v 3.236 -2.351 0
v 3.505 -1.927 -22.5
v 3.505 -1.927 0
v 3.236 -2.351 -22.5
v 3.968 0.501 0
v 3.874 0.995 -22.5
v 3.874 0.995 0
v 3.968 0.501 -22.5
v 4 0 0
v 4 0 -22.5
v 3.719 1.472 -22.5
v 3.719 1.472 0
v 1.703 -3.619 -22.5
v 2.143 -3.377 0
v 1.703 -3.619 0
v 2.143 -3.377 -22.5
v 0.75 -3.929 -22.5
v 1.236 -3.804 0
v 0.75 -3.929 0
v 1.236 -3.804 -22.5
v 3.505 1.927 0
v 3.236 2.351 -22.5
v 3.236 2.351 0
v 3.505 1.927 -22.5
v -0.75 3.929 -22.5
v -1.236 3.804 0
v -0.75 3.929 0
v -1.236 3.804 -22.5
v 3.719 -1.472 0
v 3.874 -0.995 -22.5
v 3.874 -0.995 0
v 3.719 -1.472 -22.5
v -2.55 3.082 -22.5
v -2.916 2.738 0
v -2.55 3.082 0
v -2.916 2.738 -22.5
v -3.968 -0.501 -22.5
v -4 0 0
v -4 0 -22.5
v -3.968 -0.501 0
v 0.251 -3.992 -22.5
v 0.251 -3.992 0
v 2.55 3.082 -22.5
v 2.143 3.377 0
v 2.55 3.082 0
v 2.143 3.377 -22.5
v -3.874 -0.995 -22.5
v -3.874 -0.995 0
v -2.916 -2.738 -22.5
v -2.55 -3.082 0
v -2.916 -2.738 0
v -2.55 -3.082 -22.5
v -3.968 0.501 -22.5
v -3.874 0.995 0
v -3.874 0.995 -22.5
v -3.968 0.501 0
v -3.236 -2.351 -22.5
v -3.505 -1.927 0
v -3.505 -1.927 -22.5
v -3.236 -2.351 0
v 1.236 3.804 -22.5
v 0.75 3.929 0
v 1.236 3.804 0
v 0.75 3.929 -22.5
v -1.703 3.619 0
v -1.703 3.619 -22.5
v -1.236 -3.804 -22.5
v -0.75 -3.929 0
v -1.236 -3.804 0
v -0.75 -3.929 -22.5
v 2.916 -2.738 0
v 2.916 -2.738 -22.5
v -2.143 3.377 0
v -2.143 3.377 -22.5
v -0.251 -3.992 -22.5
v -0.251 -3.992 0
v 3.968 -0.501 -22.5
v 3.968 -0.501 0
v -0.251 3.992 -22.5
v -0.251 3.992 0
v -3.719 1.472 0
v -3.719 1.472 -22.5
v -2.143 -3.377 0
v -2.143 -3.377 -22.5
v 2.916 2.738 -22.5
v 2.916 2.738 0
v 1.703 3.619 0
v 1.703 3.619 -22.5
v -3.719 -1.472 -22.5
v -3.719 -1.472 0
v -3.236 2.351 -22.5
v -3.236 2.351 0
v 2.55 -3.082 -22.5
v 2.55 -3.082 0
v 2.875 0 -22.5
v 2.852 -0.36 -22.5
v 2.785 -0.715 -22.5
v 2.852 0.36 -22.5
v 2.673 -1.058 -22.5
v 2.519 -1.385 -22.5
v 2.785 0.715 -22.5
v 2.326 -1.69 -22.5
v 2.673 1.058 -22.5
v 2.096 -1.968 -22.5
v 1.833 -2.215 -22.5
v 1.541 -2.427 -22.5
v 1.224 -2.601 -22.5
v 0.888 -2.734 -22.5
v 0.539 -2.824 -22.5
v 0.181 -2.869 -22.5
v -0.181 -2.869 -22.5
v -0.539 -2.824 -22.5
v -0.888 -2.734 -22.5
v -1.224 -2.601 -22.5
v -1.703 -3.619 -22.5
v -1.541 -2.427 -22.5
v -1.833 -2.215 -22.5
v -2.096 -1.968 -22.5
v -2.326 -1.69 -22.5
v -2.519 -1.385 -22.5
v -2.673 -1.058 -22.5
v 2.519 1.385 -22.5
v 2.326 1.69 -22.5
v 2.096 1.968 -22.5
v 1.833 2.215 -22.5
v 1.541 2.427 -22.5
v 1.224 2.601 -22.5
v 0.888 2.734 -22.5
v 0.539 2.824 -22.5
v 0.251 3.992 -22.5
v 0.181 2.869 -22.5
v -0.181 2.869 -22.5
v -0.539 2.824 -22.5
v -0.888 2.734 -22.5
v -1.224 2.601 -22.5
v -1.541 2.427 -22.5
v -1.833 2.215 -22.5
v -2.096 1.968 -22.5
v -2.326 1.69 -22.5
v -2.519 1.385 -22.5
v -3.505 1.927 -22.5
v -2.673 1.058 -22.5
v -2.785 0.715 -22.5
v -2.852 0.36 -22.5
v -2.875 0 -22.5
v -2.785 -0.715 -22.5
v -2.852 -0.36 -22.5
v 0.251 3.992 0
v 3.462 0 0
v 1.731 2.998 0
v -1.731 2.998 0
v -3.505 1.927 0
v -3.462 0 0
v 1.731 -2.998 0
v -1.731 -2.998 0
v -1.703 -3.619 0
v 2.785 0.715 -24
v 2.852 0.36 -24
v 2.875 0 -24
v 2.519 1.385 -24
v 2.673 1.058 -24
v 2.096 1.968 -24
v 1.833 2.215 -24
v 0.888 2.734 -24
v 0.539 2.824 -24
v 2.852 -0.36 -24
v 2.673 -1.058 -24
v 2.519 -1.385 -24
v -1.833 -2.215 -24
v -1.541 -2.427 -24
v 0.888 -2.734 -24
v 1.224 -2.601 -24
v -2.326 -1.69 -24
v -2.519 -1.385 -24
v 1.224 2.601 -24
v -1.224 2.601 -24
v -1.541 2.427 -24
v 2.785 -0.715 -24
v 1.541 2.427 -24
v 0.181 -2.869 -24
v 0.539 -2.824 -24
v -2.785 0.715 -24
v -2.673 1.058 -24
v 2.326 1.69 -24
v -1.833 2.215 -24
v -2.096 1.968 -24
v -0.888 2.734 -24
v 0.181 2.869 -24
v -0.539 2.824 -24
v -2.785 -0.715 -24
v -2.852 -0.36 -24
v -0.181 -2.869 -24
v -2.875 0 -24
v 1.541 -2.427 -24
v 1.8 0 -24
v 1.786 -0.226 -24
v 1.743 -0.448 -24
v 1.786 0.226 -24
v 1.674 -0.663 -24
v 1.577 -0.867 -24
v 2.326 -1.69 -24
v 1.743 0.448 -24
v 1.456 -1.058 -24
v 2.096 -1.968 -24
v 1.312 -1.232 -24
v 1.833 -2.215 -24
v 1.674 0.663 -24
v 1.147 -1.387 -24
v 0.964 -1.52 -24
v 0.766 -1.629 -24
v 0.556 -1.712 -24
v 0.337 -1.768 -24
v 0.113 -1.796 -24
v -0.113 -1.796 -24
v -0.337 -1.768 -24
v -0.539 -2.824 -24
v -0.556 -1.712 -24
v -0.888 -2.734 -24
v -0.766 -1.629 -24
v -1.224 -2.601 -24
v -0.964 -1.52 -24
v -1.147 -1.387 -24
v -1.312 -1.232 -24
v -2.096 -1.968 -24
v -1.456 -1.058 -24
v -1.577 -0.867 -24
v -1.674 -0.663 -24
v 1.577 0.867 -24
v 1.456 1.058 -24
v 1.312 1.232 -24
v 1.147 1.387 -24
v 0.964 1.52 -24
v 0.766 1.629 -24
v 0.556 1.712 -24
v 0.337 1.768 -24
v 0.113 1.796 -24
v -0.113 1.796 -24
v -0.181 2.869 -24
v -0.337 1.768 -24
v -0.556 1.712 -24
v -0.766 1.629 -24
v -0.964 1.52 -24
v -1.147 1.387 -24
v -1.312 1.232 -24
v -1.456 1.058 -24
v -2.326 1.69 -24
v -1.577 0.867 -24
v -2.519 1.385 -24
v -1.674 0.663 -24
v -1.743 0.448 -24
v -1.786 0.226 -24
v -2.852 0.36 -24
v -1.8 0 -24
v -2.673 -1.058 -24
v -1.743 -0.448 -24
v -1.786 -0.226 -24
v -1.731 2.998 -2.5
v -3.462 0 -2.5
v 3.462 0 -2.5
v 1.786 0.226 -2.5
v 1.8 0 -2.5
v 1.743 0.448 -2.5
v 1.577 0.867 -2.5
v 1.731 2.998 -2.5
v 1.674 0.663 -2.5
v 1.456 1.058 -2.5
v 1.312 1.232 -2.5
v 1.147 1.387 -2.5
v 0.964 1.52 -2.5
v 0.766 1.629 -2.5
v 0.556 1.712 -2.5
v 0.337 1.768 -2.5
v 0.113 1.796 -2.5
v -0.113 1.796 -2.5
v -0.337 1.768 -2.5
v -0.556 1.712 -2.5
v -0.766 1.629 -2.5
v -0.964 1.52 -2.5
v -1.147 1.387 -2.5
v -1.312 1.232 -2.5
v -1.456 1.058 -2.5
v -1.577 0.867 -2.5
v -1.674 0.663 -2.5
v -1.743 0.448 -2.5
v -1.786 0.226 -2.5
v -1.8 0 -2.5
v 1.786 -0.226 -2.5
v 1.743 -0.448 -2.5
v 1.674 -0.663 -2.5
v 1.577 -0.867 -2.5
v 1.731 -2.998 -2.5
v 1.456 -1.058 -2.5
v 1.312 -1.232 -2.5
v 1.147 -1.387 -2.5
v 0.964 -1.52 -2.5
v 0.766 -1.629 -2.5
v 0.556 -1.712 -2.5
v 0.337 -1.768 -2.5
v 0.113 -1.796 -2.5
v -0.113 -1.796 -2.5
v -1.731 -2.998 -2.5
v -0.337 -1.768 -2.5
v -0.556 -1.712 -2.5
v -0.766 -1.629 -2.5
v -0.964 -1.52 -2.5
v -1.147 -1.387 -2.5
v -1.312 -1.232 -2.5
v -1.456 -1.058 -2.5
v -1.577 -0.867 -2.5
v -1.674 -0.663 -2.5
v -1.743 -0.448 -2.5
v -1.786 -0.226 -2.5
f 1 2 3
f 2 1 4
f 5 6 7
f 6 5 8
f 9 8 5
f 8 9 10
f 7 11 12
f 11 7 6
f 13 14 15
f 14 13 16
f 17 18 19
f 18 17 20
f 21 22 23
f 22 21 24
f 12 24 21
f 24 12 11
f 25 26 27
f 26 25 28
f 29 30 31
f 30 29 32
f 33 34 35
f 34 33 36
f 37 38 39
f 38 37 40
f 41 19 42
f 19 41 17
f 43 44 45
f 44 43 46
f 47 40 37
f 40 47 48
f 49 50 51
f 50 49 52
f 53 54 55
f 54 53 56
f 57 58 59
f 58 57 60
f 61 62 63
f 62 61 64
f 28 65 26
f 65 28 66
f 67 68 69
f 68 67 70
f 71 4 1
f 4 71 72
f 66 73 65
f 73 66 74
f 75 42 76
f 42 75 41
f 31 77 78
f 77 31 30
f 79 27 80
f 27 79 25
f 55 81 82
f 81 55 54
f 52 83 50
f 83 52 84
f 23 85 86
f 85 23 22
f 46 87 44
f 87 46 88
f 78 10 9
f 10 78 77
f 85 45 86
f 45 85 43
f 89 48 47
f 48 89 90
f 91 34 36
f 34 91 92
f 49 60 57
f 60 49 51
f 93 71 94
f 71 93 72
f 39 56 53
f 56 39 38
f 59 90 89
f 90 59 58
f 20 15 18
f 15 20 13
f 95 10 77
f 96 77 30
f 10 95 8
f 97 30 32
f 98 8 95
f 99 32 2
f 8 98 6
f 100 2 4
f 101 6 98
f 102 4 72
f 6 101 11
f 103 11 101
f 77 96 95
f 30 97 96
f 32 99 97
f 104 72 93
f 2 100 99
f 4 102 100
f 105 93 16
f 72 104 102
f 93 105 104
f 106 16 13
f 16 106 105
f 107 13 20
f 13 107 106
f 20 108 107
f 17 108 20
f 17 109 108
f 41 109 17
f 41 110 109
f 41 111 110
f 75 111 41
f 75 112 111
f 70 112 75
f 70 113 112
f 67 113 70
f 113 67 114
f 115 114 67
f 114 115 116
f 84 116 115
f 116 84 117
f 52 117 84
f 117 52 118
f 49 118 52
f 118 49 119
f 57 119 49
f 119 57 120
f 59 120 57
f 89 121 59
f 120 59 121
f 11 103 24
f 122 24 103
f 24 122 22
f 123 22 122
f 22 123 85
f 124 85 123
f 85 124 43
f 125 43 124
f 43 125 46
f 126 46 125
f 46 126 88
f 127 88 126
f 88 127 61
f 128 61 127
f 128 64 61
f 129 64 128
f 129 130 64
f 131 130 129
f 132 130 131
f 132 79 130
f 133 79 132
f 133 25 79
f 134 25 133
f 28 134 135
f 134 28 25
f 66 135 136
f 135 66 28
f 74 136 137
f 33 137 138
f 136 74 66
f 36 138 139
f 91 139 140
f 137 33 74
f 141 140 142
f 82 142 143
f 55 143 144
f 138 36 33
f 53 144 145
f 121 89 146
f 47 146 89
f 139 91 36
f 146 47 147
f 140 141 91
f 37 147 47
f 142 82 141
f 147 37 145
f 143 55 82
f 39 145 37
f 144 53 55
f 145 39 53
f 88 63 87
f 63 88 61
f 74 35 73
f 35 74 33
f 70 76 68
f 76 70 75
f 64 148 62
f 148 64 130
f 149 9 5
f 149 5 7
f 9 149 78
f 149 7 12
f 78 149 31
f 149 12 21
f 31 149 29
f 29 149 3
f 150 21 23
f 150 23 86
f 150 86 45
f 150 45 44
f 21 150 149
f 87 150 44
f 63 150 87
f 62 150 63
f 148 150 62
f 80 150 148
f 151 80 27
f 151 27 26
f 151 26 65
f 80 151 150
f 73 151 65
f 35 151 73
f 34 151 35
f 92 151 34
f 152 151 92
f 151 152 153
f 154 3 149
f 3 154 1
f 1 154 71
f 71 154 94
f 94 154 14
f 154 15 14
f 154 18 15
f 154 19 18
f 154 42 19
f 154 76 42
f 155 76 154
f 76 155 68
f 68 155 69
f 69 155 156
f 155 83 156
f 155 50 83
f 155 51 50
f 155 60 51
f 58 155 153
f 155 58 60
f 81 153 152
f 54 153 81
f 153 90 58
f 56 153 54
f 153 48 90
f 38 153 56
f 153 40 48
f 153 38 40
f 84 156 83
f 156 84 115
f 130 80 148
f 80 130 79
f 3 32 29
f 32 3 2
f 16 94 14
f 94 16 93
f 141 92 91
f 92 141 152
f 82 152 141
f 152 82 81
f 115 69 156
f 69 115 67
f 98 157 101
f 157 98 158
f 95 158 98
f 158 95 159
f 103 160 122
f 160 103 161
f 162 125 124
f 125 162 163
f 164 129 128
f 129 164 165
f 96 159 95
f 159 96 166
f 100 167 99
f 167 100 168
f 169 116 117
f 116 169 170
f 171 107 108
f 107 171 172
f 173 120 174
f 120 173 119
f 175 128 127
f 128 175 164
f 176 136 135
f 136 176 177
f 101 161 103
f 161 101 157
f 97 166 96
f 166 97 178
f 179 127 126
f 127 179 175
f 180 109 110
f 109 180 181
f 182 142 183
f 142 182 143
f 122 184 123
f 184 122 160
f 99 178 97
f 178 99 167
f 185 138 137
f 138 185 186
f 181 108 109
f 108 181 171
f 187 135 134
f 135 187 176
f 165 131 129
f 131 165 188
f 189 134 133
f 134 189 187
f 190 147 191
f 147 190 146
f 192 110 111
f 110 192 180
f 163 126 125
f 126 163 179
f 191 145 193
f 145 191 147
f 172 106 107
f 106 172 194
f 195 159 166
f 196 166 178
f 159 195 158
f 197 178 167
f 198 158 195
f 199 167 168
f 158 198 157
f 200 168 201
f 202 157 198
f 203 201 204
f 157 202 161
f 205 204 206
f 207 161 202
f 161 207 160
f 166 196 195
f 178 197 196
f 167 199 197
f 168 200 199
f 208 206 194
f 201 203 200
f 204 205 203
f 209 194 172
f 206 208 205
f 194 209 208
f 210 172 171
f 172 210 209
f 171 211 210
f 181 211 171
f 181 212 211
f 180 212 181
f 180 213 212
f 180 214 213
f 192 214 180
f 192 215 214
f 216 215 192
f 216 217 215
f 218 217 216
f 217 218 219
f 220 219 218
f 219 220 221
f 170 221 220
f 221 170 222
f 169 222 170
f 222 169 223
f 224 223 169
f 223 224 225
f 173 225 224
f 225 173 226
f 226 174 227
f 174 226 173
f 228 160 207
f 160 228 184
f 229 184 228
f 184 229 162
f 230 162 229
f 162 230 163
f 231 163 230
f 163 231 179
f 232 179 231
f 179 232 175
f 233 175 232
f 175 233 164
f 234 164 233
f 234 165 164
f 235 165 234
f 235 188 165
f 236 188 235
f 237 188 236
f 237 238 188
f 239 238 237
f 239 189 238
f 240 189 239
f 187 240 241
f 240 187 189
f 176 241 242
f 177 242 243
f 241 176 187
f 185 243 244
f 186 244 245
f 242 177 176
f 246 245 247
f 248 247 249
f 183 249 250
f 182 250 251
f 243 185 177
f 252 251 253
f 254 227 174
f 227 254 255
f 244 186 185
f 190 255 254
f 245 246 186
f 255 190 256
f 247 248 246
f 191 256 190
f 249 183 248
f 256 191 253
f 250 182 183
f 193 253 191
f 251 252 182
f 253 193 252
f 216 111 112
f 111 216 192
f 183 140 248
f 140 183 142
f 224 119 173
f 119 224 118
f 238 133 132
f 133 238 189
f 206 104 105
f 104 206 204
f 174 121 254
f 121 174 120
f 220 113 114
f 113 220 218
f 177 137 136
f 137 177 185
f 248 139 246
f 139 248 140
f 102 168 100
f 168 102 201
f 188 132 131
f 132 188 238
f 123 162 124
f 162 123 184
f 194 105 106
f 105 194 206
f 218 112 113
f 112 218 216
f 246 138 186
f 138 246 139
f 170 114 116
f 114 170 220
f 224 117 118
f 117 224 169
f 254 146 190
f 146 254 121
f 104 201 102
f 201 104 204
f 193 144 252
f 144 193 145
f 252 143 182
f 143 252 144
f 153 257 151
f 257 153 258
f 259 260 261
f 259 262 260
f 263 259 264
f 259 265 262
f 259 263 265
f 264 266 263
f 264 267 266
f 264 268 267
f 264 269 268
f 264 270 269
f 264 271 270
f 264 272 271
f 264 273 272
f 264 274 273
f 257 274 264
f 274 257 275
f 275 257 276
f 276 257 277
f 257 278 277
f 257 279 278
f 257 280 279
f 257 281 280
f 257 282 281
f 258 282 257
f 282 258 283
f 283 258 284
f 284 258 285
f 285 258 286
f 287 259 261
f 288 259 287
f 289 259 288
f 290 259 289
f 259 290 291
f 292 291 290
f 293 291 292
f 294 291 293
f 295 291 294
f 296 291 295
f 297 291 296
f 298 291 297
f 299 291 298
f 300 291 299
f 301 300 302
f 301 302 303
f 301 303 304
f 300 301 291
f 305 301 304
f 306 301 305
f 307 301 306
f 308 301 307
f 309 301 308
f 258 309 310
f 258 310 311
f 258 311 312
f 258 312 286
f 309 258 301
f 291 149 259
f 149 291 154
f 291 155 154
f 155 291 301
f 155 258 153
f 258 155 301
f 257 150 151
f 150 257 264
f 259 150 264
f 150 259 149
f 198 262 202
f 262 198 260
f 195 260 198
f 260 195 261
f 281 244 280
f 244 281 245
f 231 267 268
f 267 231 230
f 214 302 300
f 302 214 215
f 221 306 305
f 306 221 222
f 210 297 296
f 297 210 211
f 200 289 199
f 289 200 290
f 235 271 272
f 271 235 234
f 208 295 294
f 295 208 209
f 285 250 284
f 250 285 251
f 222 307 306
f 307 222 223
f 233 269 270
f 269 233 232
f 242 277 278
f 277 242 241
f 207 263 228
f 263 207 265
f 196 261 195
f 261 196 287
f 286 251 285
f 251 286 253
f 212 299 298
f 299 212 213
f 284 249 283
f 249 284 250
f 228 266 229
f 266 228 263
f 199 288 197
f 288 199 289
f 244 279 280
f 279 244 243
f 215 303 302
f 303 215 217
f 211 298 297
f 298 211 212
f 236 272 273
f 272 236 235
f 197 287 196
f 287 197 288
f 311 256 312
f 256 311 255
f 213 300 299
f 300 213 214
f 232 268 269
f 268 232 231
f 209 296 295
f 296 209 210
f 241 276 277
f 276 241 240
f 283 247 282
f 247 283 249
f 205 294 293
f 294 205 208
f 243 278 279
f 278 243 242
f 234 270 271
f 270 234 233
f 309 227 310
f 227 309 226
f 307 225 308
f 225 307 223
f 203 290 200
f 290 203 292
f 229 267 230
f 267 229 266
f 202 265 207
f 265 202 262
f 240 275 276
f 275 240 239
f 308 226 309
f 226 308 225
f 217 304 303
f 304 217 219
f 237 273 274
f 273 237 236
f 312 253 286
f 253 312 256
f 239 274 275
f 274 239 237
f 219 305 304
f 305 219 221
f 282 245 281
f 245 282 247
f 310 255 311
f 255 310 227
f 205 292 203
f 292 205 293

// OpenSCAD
$fn = 50;

difference() {
	union() {
		translate(v = [0, 0, -22.5]) {
			cylinder(h = 22.5, r = 4.0);
		}
		#translate(v = [0, 0, -24.0]) {
			cylinder(h = 24, r = 2.875);
		}
	}
	union() {
		translate(v = [0, 0, 0]) {
			rotate(a = [0, 0, 0]) {
				difference() {
					union() {
						translate(v = [0, 0, -2.5]) {
							linear_extrude(height = 2.5) {
								polygon(points = [[3.4619999999999997, 0.0], [1.7310000000000003, 2.9981799479017264], [-1.7309999999999992, 2.9981799479017264], [-3.4619999999999997, 4.2397272186481365e-16], [-1.7310000000000014, -2.998179947901726], [1.7309999999999977, -2.9981799479017277]]);
							}
						}
					}
					union();
				}
			}
		}
		#translate(v = [0, 0, -100.0]) {
			cylinder(h = 200, r = 1.8);
		}
	}
}
